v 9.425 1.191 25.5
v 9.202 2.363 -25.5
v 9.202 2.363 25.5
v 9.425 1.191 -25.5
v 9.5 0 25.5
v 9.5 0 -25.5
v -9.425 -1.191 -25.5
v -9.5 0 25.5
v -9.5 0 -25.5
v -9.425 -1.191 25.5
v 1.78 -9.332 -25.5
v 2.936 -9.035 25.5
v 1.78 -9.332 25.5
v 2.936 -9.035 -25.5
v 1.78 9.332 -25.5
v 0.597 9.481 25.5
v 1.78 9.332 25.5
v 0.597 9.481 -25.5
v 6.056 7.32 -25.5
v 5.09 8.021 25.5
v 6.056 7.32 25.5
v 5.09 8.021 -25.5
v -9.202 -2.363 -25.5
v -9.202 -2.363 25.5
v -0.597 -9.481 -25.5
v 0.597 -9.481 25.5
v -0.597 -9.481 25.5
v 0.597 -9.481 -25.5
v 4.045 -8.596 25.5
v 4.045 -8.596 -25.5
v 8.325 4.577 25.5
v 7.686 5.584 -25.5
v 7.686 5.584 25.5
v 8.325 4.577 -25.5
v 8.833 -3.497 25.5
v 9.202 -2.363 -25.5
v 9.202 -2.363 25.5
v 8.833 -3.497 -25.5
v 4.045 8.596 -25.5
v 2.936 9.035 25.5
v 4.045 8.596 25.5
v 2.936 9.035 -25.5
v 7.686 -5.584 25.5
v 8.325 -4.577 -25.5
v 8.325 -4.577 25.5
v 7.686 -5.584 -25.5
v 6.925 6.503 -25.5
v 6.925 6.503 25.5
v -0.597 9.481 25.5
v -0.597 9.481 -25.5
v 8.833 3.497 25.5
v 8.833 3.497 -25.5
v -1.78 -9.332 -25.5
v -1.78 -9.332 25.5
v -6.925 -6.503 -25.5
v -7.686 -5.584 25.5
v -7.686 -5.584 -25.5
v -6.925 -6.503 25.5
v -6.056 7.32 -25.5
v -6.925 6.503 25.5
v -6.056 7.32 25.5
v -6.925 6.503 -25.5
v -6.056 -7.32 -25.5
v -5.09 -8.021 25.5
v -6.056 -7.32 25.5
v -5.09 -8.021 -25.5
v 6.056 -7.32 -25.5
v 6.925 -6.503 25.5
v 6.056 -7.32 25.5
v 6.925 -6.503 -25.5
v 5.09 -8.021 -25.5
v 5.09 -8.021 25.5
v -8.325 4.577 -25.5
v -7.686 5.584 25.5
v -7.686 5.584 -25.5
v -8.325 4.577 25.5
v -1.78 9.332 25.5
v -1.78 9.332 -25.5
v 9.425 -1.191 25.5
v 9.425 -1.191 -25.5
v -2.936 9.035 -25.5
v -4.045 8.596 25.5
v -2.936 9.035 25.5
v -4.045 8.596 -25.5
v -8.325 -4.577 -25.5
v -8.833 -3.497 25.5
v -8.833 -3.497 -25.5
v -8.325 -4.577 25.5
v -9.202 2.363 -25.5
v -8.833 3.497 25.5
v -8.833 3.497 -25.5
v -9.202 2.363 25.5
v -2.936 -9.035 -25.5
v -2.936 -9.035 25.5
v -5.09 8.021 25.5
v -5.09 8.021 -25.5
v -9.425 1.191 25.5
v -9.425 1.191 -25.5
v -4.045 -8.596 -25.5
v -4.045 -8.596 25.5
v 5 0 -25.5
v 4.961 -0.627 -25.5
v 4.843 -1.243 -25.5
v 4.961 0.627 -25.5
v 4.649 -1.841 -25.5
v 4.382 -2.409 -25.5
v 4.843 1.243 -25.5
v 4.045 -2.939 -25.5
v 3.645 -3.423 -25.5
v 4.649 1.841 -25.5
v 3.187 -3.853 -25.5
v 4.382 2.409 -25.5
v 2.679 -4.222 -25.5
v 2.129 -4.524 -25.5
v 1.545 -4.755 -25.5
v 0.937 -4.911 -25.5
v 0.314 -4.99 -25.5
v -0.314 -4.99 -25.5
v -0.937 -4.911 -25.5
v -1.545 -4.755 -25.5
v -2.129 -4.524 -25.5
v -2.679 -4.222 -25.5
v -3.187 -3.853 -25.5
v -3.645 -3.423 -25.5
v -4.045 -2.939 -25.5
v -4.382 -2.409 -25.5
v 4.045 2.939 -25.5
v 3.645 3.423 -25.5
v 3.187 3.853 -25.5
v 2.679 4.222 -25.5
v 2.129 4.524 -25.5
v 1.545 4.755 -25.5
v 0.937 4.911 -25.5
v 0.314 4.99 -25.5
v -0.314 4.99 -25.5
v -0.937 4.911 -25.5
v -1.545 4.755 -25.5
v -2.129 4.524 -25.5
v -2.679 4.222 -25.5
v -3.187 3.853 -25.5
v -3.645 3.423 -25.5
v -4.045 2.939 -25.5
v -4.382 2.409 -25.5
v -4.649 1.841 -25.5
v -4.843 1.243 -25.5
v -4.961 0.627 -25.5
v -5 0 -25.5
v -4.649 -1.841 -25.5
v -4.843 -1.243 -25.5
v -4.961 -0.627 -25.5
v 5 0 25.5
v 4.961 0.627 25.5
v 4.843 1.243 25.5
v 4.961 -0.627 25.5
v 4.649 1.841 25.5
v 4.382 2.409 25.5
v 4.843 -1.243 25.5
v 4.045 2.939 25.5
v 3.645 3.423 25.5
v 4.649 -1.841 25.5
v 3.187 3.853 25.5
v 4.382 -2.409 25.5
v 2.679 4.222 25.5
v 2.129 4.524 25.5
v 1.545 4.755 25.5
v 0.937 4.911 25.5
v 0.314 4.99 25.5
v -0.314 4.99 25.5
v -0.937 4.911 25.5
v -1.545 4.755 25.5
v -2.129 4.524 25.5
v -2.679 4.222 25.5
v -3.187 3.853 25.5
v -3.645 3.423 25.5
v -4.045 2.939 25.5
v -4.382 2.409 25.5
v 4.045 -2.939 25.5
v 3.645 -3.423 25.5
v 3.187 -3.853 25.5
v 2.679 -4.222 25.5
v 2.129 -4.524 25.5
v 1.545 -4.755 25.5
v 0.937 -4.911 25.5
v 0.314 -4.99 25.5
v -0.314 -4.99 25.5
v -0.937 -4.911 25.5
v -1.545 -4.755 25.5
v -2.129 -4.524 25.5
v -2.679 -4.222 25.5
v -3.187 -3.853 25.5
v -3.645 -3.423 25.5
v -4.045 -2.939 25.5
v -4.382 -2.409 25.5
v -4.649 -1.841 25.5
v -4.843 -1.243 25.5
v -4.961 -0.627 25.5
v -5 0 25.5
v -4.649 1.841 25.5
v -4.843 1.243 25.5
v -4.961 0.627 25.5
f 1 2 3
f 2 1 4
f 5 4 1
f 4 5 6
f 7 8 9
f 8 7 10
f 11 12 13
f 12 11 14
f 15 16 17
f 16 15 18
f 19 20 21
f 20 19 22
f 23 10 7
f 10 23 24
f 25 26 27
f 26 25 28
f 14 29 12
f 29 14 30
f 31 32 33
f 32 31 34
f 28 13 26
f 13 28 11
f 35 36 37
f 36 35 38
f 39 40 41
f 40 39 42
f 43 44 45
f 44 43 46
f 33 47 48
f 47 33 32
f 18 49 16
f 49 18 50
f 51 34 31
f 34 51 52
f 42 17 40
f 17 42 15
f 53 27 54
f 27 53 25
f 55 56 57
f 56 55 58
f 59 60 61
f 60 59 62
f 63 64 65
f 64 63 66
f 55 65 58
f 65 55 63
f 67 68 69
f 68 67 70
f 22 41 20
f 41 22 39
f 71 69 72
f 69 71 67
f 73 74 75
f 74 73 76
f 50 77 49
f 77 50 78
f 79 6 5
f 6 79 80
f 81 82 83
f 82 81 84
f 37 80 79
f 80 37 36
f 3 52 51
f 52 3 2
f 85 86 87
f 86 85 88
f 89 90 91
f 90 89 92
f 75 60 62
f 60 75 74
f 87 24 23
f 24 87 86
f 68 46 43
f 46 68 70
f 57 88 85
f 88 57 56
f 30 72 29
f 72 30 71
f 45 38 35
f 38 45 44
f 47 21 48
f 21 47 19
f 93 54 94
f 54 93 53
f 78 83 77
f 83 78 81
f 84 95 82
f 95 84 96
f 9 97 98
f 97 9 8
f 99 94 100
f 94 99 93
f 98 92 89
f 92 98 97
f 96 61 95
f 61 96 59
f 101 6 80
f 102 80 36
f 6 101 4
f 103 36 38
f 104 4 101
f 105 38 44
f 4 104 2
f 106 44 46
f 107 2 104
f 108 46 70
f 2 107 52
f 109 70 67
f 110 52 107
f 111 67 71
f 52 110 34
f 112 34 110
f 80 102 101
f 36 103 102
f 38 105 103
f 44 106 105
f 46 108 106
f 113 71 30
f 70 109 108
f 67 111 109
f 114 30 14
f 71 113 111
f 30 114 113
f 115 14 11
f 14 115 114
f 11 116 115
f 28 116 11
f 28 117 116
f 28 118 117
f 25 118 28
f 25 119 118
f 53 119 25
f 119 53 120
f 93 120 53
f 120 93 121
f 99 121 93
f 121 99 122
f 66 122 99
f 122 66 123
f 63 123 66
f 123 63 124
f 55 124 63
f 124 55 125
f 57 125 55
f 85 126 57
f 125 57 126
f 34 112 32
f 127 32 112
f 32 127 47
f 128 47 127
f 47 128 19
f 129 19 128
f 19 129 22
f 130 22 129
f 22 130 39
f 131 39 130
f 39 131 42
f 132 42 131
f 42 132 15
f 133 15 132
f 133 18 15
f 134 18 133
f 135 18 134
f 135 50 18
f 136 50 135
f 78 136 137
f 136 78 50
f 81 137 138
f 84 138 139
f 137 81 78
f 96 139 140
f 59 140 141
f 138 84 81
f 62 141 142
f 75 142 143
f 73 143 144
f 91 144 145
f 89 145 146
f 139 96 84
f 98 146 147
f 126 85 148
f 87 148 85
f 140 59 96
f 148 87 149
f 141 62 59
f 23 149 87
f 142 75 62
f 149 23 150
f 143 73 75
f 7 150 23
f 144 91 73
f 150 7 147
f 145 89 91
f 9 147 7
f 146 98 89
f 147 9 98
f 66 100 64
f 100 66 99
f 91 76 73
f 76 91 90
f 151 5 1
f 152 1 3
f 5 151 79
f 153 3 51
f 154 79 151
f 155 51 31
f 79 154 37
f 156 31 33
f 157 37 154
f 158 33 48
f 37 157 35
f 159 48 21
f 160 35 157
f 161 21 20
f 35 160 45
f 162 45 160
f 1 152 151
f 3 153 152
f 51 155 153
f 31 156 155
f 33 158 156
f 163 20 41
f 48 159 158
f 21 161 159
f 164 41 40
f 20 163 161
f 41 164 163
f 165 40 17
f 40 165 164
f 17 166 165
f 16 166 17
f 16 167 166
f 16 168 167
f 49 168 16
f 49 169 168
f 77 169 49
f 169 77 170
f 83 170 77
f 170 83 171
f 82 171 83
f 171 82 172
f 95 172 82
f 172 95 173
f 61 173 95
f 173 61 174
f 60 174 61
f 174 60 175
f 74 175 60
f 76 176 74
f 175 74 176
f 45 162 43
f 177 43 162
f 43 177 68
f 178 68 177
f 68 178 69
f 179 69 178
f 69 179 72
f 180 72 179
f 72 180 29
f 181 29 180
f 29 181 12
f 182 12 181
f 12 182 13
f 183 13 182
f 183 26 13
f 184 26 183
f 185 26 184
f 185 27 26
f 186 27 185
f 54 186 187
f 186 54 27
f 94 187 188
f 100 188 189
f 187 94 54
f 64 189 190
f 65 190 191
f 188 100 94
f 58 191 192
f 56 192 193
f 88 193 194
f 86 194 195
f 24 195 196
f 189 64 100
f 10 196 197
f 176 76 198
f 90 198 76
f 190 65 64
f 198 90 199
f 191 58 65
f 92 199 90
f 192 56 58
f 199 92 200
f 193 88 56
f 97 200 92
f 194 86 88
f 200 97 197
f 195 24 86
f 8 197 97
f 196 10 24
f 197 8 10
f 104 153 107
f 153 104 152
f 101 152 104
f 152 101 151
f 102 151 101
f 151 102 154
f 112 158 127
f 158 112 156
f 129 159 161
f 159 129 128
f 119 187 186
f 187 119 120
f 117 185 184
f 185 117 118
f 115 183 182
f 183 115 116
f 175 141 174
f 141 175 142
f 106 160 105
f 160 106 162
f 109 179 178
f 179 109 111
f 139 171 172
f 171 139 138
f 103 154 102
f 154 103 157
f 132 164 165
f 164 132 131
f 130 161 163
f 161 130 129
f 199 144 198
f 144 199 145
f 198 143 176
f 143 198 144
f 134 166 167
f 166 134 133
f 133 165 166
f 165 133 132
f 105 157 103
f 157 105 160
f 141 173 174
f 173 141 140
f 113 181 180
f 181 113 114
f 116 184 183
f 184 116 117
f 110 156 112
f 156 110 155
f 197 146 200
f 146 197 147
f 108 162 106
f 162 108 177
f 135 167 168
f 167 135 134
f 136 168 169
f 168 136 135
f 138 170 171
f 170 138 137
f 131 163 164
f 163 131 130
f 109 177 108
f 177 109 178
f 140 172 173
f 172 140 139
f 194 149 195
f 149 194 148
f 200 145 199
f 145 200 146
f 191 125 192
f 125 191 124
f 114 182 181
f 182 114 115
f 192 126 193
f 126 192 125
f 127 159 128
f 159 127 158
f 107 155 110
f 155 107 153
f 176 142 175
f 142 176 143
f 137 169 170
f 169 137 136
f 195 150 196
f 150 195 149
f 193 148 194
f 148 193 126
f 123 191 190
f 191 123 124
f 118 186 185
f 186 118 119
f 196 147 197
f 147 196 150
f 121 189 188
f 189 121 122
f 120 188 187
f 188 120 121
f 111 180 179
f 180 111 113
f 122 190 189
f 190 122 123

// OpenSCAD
$fn = 50;


difference() {
	union() {
		translate(v = [0, 0, -25.5000000000]) {
			cylinder(h = 51, r = 9.5000000000);
		}
	}
	union() {
		translate(v = [0, 0, -100.0000000000]) {
			cylinder(h = 200, r = 5.0000000000);
		}
	}
}
